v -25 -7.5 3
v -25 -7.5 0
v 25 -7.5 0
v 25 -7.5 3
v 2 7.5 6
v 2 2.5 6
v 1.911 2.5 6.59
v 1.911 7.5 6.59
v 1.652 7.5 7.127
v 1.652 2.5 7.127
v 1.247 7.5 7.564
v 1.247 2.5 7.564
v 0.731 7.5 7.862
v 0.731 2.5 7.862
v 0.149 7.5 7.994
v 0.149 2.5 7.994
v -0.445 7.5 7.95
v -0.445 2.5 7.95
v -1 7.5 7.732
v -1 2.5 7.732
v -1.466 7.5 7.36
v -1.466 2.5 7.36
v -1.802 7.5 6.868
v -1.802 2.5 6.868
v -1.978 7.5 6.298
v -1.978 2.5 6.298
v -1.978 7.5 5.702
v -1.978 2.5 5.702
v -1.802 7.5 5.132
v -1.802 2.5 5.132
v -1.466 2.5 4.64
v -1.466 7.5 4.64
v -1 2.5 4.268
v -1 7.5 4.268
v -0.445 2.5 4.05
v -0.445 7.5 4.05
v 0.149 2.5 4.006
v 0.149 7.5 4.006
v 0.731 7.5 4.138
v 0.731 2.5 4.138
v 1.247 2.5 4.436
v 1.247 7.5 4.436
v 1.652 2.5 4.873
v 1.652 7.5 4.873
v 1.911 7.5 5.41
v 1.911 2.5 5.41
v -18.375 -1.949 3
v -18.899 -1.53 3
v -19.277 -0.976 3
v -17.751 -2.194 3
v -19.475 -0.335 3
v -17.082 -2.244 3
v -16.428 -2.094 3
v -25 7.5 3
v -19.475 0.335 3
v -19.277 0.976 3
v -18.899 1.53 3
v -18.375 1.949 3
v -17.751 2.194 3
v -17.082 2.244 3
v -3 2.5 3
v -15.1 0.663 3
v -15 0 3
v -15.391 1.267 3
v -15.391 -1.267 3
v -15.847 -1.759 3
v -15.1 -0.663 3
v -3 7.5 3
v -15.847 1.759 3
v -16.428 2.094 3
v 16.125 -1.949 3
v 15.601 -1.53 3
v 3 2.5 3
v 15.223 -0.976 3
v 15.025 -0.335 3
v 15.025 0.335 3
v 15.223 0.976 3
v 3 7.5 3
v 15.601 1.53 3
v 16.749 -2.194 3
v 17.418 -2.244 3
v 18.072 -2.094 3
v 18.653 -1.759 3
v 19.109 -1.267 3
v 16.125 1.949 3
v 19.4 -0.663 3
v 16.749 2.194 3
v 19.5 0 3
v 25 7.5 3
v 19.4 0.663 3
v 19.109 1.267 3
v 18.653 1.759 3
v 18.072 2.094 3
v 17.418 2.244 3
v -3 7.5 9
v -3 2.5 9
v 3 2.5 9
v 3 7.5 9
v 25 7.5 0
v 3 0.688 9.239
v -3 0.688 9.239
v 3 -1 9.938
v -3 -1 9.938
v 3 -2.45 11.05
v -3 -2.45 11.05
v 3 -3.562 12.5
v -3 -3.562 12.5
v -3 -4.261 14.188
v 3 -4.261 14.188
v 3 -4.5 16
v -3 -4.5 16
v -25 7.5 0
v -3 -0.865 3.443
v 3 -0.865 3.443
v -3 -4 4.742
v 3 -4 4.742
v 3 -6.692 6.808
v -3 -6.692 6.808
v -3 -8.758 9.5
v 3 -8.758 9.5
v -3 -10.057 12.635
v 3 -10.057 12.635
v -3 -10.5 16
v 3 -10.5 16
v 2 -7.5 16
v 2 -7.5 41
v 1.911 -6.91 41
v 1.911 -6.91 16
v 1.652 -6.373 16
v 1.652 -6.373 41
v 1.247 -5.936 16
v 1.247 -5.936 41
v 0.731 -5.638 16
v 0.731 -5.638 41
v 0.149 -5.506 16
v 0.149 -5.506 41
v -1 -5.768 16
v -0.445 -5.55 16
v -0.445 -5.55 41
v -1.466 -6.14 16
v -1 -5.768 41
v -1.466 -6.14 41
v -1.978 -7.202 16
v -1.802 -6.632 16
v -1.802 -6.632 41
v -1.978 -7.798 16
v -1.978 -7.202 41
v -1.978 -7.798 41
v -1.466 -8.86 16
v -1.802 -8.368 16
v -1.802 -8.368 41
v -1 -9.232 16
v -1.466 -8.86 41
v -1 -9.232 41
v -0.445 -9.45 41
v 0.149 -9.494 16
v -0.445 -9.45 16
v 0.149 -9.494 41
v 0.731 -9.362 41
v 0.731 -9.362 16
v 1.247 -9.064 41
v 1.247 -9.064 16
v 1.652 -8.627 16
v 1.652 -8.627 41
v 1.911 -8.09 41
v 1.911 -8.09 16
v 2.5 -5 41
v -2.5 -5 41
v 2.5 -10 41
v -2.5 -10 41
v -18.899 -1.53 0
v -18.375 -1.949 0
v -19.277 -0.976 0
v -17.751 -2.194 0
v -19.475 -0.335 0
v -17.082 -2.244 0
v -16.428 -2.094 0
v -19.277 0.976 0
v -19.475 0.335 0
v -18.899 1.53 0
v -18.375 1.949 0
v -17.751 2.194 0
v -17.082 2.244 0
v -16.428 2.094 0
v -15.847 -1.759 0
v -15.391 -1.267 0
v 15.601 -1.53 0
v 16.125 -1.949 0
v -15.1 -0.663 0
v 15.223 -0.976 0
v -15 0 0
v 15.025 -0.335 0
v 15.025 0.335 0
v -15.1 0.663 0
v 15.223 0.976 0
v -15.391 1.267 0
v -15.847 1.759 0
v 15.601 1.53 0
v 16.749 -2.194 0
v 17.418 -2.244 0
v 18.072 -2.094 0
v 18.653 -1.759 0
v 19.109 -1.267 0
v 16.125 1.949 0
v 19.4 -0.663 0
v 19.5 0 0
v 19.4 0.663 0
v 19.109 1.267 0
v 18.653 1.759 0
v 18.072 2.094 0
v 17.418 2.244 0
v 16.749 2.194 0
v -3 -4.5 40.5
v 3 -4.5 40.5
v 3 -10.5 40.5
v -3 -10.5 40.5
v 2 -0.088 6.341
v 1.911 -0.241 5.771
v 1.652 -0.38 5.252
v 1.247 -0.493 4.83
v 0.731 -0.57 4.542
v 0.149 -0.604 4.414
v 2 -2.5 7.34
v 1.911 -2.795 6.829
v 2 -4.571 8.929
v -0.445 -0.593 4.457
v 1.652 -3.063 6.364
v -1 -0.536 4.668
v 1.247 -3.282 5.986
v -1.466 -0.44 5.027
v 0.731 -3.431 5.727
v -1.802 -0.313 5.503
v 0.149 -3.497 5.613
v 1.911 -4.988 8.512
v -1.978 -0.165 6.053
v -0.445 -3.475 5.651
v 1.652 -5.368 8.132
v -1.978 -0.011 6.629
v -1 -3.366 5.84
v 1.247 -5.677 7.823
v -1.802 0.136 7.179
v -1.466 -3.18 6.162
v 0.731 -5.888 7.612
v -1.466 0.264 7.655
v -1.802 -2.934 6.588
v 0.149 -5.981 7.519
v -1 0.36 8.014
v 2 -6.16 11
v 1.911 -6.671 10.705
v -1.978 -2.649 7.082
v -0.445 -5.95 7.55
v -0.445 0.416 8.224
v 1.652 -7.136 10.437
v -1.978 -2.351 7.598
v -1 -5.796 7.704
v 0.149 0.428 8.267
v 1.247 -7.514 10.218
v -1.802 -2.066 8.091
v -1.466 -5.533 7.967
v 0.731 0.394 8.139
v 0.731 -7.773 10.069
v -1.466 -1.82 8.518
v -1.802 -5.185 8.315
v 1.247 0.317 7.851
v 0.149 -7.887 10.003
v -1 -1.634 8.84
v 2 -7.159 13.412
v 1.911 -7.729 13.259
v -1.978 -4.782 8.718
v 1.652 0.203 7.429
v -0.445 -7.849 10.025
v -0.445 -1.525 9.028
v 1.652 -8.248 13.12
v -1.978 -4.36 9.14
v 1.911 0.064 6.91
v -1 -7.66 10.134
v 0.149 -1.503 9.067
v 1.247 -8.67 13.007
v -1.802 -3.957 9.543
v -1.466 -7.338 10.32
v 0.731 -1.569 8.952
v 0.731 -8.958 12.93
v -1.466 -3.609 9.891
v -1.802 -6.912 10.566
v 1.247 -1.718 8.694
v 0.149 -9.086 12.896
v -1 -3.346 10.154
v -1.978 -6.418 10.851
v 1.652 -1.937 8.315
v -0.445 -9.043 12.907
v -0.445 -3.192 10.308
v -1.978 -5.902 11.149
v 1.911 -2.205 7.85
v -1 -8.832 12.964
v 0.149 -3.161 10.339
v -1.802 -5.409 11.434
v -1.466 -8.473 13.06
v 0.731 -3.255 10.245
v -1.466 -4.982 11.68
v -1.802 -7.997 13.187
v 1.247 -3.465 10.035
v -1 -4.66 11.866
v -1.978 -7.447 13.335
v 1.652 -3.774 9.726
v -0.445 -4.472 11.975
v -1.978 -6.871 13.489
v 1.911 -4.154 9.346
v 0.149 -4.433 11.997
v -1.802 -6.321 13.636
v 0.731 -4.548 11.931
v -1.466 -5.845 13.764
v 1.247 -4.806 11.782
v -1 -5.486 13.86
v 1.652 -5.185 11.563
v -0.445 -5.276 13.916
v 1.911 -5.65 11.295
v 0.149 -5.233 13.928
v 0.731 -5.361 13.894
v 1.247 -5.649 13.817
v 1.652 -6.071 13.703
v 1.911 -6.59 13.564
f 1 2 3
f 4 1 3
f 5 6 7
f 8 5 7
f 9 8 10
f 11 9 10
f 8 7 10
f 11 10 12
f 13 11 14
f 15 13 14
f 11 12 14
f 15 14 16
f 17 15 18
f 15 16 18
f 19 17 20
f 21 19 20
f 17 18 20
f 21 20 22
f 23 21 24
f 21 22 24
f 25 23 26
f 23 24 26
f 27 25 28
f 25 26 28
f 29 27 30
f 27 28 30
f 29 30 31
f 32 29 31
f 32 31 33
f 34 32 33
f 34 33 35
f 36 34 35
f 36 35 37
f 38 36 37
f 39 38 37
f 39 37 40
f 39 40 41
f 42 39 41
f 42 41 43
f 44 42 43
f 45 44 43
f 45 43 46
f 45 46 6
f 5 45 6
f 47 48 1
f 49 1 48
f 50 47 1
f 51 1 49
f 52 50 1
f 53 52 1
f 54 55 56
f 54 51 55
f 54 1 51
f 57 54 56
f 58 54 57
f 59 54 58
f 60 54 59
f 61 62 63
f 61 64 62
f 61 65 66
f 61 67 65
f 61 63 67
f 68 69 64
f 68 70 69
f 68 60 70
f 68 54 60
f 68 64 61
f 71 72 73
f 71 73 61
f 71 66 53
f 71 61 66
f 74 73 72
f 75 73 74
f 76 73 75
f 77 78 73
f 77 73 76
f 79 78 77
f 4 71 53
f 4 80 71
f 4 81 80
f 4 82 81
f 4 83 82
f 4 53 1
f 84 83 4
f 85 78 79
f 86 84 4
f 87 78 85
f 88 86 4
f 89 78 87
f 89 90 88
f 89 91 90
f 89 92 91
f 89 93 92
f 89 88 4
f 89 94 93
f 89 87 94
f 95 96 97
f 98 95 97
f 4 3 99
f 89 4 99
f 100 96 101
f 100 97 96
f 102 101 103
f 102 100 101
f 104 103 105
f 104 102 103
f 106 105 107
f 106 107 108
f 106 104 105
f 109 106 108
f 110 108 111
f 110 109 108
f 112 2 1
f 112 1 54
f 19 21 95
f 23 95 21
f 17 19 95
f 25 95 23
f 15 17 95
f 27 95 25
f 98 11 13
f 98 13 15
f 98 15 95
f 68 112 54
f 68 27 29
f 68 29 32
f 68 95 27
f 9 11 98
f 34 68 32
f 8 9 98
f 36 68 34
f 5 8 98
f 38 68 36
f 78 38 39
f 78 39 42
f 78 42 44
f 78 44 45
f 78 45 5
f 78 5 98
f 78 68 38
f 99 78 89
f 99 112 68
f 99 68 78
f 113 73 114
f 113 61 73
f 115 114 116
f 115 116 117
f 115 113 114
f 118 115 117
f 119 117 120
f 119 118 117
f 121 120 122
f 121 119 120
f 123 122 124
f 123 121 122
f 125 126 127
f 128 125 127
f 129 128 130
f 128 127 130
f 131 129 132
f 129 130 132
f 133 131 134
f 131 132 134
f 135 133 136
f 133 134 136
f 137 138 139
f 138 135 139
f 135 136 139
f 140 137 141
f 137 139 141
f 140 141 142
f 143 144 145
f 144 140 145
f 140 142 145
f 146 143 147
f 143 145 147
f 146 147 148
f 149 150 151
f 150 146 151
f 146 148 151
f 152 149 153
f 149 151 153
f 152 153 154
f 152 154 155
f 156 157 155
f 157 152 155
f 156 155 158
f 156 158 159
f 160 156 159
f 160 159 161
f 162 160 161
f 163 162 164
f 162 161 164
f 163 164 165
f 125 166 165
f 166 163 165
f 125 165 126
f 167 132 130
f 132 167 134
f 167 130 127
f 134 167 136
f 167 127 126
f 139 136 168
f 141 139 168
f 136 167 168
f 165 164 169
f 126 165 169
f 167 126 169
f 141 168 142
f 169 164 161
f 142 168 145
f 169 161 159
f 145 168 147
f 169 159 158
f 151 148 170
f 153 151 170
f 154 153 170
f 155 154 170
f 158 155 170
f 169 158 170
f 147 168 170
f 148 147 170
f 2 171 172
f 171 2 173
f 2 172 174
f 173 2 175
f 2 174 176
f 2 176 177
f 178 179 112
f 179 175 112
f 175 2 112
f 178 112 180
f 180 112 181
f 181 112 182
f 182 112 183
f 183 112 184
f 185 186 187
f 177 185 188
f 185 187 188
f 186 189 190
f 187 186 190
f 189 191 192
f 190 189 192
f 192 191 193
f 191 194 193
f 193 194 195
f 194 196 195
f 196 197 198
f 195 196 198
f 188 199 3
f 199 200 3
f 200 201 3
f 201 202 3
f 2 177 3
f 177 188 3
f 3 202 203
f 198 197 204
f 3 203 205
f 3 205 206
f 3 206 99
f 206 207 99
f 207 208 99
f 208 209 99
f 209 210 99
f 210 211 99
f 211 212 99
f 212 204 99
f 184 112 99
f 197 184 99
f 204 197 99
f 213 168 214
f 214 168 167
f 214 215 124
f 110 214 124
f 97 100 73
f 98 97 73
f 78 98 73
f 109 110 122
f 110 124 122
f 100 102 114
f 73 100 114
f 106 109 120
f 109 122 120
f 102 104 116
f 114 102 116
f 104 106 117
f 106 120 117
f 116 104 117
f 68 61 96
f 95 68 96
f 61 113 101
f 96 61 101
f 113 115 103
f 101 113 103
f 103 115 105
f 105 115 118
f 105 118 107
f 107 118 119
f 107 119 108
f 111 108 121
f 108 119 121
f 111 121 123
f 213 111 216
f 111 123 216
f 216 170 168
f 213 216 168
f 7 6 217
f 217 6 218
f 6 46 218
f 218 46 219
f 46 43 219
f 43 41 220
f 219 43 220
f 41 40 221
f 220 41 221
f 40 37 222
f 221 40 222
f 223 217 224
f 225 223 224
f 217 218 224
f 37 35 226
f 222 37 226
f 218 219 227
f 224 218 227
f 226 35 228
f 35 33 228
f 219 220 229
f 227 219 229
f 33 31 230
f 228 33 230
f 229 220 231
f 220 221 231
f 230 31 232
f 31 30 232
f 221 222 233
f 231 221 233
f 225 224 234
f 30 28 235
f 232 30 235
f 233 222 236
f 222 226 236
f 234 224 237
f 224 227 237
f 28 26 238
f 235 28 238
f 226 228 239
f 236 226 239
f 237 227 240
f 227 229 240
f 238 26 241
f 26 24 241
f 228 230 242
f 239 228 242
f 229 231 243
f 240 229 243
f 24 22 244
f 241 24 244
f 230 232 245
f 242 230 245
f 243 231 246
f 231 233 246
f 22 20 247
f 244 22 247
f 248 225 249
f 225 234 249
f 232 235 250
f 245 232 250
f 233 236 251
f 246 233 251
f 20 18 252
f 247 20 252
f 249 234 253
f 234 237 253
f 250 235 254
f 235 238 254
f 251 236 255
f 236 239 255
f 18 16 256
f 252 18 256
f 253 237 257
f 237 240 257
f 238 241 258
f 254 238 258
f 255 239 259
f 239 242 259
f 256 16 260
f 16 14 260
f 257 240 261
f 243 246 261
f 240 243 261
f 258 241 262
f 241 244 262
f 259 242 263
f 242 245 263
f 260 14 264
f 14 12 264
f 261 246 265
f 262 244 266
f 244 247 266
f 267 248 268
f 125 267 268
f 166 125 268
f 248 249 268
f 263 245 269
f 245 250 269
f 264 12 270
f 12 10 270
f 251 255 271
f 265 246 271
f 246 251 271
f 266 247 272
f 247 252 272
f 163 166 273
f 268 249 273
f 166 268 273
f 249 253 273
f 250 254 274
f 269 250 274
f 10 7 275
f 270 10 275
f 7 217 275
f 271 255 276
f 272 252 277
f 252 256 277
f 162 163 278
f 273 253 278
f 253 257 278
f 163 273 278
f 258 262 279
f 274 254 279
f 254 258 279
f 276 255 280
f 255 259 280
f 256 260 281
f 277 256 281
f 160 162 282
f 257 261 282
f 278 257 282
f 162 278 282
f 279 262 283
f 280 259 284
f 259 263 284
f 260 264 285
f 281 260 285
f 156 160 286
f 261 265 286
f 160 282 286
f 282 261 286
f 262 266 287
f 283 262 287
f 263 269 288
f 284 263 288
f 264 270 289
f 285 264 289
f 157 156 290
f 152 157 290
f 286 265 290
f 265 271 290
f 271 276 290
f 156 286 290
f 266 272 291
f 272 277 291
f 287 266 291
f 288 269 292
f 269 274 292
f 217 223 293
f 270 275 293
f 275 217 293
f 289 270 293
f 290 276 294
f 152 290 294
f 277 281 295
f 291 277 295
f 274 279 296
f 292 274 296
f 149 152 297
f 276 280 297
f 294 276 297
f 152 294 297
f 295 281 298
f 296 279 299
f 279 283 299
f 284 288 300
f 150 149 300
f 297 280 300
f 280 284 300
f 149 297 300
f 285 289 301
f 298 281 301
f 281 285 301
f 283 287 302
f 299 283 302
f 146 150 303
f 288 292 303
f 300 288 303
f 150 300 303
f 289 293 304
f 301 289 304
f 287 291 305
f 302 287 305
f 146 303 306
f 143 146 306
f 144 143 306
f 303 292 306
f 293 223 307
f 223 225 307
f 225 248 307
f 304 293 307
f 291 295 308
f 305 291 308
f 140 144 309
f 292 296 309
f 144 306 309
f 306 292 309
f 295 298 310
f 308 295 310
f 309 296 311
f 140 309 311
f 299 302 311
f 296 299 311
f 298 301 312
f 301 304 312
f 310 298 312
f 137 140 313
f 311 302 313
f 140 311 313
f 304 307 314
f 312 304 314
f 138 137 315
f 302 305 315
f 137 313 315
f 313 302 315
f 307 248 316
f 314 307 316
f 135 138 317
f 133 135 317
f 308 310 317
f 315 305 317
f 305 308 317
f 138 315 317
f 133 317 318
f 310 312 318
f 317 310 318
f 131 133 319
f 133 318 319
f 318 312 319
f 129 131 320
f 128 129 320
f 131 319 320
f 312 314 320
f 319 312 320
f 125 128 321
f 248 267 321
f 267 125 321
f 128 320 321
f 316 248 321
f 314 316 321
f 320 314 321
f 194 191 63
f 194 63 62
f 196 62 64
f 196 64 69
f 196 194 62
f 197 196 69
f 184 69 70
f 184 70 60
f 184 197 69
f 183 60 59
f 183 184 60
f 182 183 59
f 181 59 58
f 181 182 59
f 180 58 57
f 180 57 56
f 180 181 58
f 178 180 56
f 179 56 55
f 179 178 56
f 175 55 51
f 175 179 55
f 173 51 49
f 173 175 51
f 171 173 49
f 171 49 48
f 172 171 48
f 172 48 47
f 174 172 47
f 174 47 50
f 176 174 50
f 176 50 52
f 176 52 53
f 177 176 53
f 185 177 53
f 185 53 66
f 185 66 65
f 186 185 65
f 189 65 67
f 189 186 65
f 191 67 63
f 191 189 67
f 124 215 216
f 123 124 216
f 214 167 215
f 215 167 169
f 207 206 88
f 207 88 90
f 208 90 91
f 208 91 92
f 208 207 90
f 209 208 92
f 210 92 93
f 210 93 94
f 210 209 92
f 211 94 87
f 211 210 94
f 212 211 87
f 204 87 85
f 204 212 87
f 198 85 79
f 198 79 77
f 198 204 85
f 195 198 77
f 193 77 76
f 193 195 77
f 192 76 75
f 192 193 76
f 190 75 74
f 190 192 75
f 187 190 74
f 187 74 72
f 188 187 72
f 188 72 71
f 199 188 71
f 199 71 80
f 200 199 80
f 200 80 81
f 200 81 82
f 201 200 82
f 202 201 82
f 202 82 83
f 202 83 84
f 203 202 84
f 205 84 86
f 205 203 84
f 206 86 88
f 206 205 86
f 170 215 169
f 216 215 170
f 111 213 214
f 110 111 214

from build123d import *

# Parameters (mm, degrees)
SKETCH_1_W      = 50
SKETCH_1_H      = 15
SKETCH_1_R      = 2.25
EXTRUDE_1_DEPTH = 3
SKETCH_4_W      = 6
SKETCH_4_H      = 6
SKETCH_4_R      = 2
CHAMFER_1_SIZE  = 0.5


with BuildPart() as part:
    # Эскиз1 → Бобышка-Вытянуть1 (new body)
    with BuildSketch(Plane.XY):
        Rectangle(SKETCH_1_W, SKETCH_1_H)
        with Locations((17.25, 0)):
            Circle(SKETCH_1_R, mode=Mode.SUBTRACT)
        with Locations((-17.25, 0)):
            Circle(SKETCH_1_R, mode=Mode.SUBTRACT)
    extrude(amount=EXTRUDE_1_DEPTH)

    # По траектории1: sweep along a path in Эскиз5
    with BuildLine(Plane.ZY) as sweep_1_path:
        Line((6, 7.5), (6, 2.5))
        ThreePointArc((6, 2.5), (8.928932188, -4.571067812), (16, -7.5))
        Line((16, -7.5), (41, -7.5))
    # Эскиз4 → По траектории1 (sweep)
    with BuildSketch(Plane(origin=(0, 7.5, 0), x_dir=(1, 0, 0), z_dir=(0, 1, 0))):
        with Locations((0, -6)):
            Rectangle(SKETCH_4_W, SKETCH_4_H)
        with Locations((0, -6)):
            Circle(SKETCH_4_R, mode=Mode.SUBTRACT)
    sweep(path=sweep_1_path.line)

    # Фаска1
    chamfer_1_edges = [part.edges().sort_by_distance(p)[0] for p in [
        (3, -7.5, 41),
        (0, -10.5, 41),
        (-3, -7.5, 41),
        (0, -4.5, 41),
    ]]
    chamfer(chamfer_1_edges, length=CHAMFER_1_SIZE)


solid = part.part
